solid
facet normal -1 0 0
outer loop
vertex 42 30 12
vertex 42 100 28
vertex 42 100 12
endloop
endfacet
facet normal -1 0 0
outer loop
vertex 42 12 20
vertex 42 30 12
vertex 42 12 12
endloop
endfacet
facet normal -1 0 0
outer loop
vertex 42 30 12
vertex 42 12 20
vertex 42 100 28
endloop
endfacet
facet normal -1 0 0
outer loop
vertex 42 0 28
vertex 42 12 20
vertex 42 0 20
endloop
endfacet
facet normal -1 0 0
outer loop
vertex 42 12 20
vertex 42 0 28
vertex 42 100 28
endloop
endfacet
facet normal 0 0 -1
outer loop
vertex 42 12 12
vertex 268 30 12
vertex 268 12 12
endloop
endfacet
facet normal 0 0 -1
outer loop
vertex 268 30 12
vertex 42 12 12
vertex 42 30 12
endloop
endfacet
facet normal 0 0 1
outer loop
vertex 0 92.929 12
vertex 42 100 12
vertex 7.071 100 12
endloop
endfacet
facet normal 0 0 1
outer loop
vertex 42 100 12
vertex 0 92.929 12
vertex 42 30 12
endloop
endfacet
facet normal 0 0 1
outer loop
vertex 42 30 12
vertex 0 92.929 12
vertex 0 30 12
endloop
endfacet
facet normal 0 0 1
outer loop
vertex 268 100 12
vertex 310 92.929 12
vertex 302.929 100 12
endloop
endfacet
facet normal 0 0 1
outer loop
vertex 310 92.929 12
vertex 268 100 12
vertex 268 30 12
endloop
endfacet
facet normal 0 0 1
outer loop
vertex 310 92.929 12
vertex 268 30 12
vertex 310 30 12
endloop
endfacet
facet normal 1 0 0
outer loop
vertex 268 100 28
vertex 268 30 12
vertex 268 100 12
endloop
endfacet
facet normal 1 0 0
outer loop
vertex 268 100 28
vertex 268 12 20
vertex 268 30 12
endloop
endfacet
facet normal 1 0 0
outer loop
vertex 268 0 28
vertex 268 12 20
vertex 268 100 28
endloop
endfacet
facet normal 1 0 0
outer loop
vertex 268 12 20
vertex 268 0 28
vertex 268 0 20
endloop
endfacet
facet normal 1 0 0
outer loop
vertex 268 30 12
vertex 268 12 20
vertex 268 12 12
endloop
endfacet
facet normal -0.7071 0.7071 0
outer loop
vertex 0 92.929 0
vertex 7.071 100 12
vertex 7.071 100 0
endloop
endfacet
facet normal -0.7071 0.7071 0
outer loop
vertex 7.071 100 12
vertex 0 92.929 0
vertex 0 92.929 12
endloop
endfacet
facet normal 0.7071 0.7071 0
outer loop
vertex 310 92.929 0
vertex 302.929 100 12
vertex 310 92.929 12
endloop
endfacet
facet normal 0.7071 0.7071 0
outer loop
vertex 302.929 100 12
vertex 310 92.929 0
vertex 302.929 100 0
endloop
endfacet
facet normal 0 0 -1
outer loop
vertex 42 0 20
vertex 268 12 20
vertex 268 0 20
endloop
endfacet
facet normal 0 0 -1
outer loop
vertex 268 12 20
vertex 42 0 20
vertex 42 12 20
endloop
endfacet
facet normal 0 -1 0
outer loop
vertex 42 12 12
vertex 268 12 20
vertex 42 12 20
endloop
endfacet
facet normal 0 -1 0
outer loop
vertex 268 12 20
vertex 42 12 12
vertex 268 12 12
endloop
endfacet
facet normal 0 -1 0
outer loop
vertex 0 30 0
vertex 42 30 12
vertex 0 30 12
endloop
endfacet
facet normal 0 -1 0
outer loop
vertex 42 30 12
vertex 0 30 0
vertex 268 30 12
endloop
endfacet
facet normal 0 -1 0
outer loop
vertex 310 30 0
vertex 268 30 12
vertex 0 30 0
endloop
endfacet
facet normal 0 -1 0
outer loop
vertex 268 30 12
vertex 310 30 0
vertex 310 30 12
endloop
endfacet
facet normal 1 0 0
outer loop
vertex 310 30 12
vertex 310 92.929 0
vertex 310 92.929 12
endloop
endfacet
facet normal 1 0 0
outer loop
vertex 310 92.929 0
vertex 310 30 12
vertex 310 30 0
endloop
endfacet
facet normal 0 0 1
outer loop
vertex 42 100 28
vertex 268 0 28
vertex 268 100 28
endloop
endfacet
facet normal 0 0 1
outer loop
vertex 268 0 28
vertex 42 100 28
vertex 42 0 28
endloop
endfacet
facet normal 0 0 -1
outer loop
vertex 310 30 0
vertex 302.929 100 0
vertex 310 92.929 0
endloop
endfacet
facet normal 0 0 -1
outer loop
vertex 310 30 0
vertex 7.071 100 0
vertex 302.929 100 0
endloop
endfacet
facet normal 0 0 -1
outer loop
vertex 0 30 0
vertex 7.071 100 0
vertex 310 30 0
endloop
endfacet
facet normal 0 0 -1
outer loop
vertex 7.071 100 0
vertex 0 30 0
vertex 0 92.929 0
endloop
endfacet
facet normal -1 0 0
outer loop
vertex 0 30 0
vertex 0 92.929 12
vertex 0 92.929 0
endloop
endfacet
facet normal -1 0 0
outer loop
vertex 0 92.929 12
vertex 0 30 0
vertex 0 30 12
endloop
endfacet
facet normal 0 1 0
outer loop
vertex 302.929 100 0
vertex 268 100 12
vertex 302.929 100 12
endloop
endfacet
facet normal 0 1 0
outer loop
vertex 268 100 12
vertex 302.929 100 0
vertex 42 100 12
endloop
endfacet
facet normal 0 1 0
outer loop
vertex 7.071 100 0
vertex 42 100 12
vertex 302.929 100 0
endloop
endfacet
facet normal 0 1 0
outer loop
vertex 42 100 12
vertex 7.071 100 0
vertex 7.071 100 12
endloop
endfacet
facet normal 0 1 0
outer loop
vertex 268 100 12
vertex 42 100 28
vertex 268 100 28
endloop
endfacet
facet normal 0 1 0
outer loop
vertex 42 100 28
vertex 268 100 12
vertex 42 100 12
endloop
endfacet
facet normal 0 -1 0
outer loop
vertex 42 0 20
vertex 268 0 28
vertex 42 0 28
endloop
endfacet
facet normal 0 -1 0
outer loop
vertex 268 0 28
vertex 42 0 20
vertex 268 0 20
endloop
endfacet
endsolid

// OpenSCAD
include <../src/wardrobe.scad>;
plank_zx_front_side();
//github_openscad -o wardrobe_3/plank_zx_front_side.stl -D wardrobe_n=3 -D cutting_edge=0 -D break_view_length=0 wardrobe_3/plank_zx_front_side_stl.scad
